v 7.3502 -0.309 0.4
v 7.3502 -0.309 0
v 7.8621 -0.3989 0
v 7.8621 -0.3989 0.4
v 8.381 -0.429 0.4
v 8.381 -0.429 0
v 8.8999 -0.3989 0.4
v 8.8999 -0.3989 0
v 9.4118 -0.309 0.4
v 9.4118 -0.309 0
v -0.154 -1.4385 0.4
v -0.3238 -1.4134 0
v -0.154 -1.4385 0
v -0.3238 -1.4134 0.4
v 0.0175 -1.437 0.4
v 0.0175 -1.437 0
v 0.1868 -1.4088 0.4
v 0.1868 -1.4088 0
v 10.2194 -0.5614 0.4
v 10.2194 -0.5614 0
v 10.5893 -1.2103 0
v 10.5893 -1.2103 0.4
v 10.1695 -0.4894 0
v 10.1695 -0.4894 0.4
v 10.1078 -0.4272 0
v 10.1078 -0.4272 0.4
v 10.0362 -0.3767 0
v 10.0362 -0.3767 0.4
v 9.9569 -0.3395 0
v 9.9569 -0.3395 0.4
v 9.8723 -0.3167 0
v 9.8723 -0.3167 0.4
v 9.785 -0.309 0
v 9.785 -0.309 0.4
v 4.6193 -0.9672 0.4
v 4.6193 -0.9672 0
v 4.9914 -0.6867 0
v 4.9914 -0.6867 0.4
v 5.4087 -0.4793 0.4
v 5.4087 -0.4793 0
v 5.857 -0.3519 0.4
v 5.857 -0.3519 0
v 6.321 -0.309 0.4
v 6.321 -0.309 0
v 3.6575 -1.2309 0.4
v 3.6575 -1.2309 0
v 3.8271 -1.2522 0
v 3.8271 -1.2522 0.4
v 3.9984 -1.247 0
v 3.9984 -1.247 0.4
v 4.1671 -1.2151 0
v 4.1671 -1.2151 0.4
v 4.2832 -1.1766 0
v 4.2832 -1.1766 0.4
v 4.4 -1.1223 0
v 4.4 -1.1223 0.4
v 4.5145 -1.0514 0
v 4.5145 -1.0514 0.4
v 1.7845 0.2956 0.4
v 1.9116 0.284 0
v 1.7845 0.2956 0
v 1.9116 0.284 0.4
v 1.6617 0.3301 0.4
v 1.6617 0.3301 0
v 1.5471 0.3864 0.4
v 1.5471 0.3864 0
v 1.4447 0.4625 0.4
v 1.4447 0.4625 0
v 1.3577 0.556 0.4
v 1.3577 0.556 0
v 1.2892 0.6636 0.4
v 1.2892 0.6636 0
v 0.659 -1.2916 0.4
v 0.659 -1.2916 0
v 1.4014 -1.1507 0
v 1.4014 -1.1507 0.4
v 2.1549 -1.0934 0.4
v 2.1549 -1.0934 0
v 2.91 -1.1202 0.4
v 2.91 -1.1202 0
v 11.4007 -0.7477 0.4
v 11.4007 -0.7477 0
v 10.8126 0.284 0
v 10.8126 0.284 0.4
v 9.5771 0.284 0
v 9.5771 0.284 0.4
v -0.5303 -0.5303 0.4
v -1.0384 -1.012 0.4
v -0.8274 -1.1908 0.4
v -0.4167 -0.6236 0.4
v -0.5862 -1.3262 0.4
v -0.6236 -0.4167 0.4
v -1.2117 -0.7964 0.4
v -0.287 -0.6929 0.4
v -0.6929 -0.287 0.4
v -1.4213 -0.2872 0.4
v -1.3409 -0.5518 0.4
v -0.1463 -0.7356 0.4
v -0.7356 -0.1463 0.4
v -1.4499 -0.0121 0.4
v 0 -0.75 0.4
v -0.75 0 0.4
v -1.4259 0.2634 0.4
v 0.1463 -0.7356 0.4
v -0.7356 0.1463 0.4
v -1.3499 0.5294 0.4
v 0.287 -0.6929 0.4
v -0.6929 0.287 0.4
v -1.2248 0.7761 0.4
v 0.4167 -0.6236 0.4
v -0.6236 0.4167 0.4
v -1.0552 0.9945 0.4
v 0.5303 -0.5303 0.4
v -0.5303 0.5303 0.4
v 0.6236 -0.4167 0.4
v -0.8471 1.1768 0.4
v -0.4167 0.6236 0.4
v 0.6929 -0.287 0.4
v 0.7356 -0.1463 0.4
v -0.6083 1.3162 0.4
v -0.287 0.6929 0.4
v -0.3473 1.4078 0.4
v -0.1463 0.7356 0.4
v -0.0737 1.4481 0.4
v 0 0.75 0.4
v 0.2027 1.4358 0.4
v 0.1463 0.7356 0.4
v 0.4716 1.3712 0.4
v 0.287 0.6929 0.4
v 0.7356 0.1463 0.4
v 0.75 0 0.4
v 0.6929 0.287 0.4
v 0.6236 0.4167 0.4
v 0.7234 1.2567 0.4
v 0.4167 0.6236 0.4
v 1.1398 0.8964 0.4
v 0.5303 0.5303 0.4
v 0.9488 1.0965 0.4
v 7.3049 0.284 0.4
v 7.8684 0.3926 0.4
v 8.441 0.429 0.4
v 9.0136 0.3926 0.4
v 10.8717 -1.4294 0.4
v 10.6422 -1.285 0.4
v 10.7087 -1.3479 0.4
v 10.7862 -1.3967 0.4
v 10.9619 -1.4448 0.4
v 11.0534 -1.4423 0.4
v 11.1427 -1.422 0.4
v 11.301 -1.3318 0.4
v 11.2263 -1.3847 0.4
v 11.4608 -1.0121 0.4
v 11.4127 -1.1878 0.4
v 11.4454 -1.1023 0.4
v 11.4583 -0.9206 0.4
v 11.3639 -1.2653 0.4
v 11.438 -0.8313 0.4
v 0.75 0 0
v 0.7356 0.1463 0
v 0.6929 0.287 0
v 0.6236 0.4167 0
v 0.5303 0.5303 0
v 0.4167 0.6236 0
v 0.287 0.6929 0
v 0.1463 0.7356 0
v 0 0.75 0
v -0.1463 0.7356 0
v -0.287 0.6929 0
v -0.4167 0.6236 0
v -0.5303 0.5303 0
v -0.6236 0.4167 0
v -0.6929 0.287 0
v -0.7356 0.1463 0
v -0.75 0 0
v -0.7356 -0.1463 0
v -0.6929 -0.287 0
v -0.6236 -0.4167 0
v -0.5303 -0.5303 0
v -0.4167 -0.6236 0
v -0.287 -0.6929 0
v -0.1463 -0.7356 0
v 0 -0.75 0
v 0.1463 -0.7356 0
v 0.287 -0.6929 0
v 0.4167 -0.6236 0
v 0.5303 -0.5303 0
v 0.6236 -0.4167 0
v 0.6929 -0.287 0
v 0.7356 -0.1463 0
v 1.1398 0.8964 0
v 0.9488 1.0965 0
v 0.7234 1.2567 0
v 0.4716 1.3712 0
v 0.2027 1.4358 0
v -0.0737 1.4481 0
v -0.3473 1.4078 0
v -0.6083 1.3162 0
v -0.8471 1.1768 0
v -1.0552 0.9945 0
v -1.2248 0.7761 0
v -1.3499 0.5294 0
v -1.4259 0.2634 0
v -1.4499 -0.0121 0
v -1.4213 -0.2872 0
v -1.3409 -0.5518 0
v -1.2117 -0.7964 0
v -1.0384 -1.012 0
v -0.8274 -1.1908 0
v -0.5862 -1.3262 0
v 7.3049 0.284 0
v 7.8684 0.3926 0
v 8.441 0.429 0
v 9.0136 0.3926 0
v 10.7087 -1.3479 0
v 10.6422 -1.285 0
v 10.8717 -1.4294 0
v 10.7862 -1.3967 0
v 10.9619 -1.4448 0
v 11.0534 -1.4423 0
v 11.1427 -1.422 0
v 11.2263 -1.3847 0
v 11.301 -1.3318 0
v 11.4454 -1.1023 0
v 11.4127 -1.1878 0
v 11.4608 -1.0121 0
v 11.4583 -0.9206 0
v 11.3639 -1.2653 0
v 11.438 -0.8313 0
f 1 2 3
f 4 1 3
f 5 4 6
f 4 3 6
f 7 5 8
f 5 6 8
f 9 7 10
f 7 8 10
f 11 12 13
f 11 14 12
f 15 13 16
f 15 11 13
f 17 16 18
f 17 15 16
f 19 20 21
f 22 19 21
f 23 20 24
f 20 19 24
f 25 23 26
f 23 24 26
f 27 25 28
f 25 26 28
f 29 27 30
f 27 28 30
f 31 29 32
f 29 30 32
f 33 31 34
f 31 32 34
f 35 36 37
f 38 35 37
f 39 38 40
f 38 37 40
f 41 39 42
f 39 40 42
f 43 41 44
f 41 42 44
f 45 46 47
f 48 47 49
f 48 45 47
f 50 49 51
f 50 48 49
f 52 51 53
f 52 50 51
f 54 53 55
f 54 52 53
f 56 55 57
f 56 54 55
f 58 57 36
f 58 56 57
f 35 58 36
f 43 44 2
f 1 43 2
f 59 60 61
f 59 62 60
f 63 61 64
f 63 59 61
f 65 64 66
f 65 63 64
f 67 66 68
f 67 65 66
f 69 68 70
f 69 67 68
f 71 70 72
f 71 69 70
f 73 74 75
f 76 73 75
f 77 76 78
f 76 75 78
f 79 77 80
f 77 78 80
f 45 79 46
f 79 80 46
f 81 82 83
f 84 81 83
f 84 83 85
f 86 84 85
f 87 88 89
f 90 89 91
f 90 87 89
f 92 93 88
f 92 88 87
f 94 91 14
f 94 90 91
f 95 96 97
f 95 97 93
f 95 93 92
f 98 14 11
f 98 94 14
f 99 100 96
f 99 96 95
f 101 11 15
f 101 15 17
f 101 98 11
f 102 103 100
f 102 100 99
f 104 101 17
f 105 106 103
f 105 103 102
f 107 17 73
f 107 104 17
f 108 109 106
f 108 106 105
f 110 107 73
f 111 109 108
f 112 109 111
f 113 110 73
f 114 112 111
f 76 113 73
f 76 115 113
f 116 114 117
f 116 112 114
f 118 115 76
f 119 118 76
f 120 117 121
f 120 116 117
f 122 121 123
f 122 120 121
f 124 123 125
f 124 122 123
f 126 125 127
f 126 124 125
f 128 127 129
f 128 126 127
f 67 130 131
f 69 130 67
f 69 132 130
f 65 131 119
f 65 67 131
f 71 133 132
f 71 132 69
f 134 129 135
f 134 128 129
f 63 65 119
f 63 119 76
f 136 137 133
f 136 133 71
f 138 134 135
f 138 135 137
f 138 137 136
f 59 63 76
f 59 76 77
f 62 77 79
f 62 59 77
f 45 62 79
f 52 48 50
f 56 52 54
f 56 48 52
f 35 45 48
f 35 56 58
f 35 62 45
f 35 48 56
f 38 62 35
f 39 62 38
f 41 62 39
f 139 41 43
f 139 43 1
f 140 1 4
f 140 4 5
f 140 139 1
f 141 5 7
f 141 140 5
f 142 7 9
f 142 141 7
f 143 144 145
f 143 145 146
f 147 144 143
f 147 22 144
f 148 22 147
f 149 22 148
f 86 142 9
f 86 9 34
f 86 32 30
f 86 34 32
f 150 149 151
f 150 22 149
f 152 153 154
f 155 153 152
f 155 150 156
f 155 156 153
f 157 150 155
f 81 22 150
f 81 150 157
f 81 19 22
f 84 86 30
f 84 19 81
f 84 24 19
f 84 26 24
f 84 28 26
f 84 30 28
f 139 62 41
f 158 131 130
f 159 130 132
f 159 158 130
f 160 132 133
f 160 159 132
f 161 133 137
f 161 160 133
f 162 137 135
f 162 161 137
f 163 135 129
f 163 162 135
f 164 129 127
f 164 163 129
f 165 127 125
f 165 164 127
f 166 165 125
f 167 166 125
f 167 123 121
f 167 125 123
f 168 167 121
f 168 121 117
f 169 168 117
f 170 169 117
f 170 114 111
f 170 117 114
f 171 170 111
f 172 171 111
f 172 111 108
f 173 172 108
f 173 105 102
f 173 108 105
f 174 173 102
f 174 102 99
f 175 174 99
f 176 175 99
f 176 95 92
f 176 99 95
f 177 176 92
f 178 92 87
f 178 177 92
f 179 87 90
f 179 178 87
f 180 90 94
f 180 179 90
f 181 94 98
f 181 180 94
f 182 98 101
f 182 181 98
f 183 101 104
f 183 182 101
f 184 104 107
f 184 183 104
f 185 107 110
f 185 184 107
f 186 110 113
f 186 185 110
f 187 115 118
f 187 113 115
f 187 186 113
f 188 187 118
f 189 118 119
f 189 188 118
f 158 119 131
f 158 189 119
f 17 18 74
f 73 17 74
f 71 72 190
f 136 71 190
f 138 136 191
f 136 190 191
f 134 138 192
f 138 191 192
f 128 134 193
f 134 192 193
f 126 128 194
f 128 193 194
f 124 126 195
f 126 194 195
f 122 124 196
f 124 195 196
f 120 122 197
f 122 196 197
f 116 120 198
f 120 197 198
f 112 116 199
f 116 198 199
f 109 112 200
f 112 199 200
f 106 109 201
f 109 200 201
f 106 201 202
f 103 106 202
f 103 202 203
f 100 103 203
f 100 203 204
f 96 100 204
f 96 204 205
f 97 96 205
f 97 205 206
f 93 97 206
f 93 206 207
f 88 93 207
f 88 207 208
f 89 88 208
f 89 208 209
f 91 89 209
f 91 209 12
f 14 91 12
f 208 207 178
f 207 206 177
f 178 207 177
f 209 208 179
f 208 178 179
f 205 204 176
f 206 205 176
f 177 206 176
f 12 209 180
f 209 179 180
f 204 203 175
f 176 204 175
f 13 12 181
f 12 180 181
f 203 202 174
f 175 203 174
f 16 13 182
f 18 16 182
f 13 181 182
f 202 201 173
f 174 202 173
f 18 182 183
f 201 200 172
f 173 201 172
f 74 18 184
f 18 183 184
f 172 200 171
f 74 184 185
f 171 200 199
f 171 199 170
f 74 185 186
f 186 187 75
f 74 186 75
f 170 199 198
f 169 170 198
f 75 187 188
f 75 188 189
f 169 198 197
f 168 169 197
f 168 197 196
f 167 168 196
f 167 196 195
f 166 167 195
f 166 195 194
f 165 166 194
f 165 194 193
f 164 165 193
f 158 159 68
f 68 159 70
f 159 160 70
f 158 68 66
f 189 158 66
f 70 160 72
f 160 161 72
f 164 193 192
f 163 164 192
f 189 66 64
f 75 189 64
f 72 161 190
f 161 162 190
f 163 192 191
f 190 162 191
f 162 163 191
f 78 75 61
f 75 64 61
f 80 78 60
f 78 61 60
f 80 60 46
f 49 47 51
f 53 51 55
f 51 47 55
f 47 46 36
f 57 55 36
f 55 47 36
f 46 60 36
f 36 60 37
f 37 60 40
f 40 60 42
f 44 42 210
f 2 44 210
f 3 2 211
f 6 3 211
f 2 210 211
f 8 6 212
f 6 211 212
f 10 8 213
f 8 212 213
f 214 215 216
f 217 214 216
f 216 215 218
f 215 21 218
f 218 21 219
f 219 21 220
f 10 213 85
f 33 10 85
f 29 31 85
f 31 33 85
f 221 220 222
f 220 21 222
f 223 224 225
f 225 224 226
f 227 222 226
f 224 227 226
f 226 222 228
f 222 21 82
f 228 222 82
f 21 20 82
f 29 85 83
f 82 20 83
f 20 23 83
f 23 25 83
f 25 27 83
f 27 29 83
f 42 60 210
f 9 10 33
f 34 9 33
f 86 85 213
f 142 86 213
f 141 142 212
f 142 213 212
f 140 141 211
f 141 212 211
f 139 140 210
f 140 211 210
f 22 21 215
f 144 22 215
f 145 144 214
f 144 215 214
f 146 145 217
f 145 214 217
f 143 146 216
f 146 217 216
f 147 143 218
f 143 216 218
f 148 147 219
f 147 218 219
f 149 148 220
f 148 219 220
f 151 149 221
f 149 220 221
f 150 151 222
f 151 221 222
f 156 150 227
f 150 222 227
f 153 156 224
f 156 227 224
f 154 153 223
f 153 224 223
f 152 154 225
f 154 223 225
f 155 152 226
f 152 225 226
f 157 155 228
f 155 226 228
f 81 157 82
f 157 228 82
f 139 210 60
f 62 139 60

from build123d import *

# Parameters (mm, degrees)
BOSS_EXTRUDE1_DEPTH = 0.4
CUT_EXTRUDE1_REACH  = 2.4
SKETCH2_R           = 0.75
FILLET1_R           = 0.5
FILLET2_R           = 0.7
FILLET3_R           = 1.1


with BuildPart() as part:
    # Sketch1 → Boss-Extrude1 (new body)
    with BuildSketch(Plane.XY):
        with BuildLine():
            Line((11.400711478, -0.747727009), (10.812582712, 0.284))
            Line((10.812582712, 0.284), (9.577065579, 0.284))
            ThreePointArc((9.577065579, 0.284), (8.441, 0.429), (7.304934421, 0.284))
            Line((7.304934421, 0.284), (1.421915609, 0.284))
            ThreePointArc((1.421915609, 0.284), (-1.127957488, 0.911159648), (0.021323855, -1.449843196))
            Line((0.021323855, -1.449843196), (0.658996505, -1.291597308))
            ThreePointArc((0.658996505, -1.291597308), (2.462224804, -1.094137246), (4.253267655, -1.381866782))
            ThreePointArc((4.253267655, -1.381866782), (5.15625108, -0.593183537), (6.321, -0.309))
            Line((6.321, -0.309), (7.350233295, -0.309))
            ThreePointArc((7.350233295, -0.309), (8.381, -0.429), (9.411766705, -0.309))
            Line((9.411766705, -0.309), (10.075524156, -0.309))
            Line((10.075524156, -0.309), (10.589288522, -1.210272991))
            ThreePointArc((10.589288522, -1.210272991), (11.226272991, -1.384711478), (11.400711478, -0.747727009))
        make_face()
    extrude(amount=BOSS_EXTRUDE1_DEPTH)

    # Sketch2 → Cut-Extrude1 (cut, up to next)
    with BuildSketch(Plane.XY, mode=Mode.PRIVATE) as cut_extrude1_sk1:
        Circle(SKETCH2_R)
    cut_extrude1_tool1 = extrude(cut_extrude1_sk1.sketch, amount=CUT_EXTRUDE1_REACH, mode=Mode.PRIVATE) & part.part
    add(cut_extrude1_tool1.solids().sort_by_distance((0, 0, 0))[0], mode=Mode.SUBTRACT)

    # Fillet1
    fillet1_edges = [part.edges().sort_by_distance(p)[0] for p in [
        (10.075524156, -0.309, 0.2),
    ]]
    fillet(fillet1_edges, radius=FILLET1_R)

    # Fillet2
    fillet2_edges = [part.edges().sort_by_distance(p)[0] for p in [
        (1.421915609, 0.284, 0.2),
    ]]
    fillet(fillet2_edges, radius=FILLET2_R)

    # Fillet3
    fillet3_edges = [part.edges().sort_by_distance(p)[0] for p in [
        (0.021323855, -1.449843196, 0.2),
        (4.253267655, -1.381866782, 0.2),
    ]]
    fillet(fillet3_edges, radius=FILLET3_R)


solid = part.part
